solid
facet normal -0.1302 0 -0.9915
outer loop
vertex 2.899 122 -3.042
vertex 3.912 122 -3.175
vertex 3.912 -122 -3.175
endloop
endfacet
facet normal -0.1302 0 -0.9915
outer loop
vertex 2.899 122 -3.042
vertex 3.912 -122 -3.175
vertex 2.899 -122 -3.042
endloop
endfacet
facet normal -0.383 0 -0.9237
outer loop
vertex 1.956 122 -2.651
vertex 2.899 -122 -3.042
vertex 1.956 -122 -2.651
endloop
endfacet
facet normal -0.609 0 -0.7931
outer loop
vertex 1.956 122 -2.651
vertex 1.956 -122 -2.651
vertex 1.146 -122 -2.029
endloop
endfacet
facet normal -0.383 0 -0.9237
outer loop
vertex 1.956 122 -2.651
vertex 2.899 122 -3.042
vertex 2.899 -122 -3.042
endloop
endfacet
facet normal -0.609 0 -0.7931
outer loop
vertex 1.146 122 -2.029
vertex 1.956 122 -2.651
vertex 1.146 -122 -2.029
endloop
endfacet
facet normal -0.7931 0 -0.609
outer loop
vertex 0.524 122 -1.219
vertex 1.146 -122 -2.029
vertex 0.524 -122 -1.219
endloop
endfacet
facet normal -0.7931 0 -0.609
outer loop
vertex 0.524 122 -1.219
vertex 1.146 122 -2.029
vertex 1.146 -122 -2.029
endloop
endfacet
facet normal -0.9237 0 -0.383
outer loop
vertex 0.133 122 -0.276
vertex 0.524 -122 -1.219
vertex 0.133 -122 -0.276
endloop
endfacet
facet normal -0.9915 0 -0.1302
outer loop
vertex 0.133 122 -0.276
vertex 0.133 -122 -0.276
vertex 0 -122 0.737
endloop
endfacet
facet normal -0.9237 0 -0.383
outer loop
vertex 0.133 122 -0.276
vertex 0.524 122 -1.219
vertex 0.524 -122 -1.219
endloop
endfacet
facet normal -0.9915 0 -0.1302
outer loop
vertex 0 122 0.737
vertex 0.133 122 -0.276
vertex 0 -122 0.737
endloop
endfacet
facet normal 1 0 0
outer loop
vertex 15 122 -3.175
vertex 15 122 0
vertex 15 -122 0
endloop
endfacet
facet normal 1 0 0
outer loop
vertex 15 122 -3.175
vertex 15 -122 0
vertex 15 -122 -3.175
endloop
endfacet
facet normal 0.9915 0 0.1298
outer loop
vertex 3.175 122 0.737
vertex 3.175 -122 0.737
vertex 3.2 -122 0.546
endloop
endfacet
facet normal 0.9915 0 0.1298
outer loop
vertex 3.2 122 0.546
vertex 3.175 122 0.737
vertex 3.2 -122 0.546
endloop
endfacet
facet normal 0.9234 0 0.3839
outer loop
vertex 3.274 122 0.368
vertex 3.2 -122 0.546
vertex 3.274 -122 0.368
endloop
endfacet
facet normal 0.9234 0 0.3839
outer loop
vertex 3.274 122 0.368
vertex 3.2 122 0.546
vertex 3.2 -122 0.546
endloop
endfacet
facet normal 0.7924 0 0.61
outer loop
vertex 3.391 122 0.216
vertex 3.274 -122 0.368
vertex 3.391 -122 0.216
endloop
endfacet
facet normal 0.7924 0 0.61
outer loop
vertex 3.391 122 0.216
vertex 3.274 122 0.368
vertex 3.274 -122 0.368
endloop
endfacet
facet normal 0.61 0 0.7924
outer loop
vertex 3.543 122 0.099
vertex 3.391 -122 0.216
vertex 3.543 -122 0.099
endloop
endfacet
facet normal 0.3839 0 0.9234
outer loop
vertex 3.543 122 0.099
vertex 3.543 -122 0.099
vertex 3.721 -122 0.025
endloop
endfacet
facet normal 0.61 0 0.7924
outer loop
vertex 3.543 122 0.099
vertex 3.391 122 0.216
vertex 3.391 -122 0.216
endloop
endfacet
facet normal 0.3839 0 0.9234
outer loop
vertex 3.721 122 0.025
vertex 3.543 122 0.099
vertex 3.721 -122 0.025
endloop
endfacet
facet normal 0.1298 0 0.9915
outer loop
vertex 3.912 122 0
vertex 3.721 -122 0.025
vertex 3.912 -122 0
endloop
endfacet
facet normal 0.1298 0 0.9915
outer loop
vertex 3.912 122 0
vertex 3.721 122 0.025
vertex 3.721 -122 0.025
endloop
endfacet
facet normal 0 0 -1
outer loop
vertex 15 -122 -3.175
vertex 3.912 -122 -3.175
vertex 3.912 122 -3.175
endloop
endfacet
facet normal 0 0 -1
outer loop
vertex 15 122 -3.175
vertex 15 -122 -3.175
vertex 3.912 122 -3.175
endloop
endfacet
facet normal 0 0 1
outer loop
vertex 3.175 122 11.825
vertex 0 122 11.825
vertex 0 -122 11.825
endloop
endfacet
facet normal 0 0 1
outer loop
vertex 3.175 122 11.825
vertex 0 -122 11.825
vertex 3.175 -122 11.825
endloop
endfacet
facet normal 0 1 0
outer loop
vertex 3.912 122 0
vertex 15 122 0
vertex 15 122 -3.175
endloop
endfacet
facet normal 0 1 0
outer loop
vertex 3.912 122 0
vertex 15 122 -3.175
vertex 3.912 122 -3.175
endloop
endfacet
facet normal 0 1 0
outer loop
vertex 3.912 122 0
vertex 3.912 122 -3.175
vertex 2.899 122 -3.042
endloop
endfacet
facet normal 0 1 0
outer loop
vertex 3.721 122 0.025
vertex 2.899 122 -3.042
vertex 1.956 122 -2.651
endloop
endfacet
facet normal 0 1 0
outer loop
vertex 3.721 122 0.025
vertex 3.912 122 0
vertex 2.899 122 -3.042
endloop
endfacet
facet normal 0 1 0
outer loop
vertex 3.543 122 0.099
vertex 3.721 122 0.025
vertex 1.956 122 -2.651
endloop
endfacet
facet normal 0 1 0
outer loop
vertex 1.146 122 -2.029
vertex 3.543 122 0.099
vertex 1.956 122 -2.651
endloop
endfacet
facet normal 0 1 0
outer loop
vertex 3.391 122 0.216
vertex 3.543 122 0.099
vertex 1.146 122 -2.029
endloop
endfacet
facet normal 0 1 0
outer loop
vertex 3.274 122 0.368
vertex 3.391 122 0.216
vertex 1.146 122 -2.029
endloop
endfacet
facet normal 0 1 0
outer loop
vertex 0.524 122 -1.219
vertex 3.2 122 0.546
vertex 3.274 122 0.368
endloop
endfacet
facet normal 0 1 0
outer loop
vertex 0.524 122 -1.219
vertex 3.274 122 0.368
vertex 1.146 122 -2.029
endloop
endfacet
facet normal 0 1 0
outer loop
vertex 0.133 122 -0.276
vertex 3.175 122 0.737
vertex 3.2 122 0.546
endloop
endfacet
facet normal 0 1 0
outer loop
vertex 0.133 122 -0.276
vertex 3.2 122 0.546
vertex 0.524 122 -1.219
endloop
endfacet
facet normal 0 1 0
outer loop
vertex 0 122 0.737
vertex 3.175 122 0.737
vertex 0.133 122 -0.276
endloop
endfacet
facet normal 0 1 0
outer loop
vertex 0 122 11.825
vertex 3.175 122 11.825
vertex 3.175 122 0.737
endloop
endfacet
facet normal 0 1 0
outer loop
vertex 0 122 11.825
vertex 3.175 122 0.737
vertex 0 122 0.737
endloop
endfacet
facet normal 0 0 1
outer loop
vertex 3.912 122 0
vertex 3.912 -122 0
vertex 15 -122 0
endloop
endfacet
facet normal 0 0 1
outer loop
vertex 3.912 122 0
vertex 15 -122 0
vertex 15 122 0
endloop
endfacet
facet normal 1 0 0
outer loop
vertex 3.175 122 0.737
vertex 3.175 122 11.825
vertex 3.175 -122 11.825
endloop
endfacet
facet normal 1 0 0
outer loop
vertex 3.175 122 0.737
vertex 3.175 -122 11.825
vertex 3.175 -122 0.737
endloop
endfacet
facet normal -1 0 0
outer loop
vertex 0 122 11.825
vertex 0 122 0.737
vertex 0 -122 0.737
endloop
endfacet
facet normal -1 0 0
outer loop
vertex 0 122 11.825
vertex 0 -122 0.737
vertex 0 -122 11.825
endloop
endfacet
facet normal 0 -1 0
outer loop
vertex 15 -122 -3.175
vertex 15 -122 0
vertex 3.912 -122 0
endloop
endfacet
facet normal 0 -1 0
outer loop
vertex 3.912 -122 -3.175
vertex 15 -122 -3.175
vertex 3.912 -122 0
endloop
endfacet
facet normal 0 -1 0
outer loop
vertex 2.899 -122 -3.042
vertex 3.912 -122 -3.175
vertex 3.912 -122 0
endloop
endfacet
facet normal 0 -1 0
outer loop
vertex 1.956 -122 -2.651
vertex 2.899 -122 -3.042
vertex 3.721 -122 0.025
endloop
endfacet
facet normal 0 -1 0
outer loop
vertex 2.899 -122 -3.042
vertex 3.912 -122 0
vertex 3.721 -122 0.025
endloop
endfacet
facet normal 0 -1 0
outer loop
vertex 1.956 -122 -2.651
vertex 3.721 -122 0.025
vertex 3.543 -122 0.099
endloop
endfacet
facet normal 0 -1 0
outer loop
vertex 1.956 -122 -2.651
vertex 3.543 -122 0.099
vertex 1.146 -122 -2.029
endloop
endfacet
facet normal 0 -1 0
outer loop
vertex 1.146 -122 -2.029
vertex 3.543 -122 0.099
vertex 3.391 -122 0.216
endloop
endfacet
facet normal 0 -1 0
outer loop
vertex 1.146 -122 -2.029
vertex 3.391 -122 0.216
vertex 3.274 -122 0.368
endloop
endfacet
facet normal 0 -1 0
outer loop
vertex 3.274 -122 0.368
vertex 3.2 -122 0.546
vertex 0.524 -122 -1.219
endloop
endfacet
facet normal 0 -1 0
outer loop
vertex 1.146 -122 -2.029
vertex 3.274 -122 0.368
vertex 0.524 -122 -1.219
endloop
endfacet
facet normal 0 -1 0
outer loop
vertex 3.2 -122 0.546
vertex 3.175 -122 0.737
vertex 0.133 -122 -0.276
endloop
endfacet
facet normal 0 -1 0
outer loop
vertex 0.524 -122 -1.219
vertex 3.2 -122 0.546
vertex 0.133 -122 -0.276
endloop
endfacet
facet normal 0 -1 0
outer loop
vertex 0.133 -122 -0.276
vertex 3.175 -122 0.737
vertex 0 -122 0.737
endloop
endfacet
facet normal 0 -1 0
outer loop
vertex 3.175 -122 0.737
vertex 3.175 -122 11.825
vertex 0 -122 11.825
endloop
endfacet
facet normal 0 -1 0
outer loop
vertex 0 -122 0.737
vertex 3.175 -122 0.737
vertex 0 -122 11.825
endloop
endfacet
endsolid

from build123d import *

# Parameters (mm, degrees)
SKETCH1_W                    = 3.175
SKETCH1_H                    = 244
BASE_FLANGE1_DEPTH           = 15
EDGE_FLANGE1_STRIP_W         = 14.1732
EDGE_FLANGE1_STRIP_H         = 3.175
EDGE_FLANGE1_STRIP_CUT_DEPTH = 244
EDGE_FLANGE1_DEPTH           = 244


# Sheet-metal steps are written as plain solids
with BuildPart() as part:
    # Sketch1 → Base-Flange1 (new body)
    with BuildSketch(Plane(origin=(0, 0, 0), x_dir=(0, 0, -1), z_dir=(1, 0, 0))):
        with Locations((1.5875, 0)):
            Rectangle(SKETCH1_W, SKETCH1_H)
    extrude(amount=BASE_FLANGE1_DEPTH)

    # Edge-Flange1 strip (across the edge) → Edge-Flange1 strip cut (cut)
    with BuildSketch(Plane.XZ.offset(-122)):
        with Locations((-3.175, -1.5875)):
            Rectangle(EDGE_FLANGE1_STRIP_W, EDGE_FLANGE1_STRIP_H)
    extrude(amount=EDGE_FLANGE1_STRIP_CUT_DEPTH, mode=Mode.SUBTRACT)

    # Edge-Flange1 section (across the edge) → Edge-Flange1 (add)
    with BuildSketch(Plane.XZ.offset(-122)):
        with BuildLine():
            Line((0, 0.7366), (0, 11.825))
            Line((0, 11.825), (3.175, 11.825))
            Line((3.175, 11.825), (3.175, 0.7366))
            ThreePointArc((3.175, 0.7366), (3.390745145, 0.215745145), (3.9116, 0))
            Line((3.9116, 0), (3.9116, -3.175))
            ThreePointArc((3.9116, -3.175), (1.145681115, -2.029318885), (0, 0.7366))
        make_face()
    extrude(amount=EDGE_FLANGE1_DEPTH)


solid = part.part
